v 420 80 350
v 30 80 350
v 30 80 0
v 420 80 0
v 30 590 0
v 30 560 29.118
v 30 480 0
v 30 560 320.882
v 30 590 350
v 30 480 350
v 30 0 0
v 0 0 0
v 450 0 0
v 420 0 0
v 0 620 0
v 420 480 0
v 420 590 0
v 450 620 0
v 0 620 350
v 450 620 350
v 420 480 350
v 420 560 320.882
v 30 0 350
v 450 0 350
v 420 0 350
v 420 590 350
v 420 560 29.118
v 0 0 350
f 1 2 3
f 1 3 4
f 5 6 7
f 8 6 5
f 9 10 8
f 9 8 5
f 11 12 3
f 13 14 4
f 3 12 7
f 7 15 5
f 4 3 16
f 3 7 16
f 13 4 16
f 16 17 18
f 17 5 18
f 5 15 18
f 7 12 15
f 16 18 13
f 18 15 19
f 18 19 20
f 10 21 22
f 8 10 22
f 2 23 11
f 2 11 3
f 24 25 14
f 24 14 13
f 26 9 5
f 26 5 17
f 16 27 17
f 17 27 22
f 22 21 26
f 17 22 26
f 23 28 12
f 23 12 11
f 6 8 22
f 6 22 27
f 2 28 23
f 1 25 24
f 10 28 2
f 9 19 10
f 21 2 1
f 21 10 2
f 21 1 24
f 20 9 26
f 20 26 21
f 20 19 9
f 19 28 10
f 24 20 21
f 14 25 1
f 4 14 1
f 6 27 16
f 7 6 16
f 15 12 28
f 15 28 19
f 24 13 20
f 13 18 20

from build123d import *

# Parameters (mm, degrees)
CROQUIS1_W              = 450
CROQUIS1_H              = 620
SALIENTE_EXTRUIR1_DEPTH = 350
CROQUIS2_W              = 390
CROQUIS2_H              = 80
CORTAR_EXTRUIR1_DEPTH   = 350
CROQUIS3_W              = 390
CROQUIS3_H              = 110
CORTAR_EXTRUIR2_DEPTH   = 350
SALIENTE_EXTRUIR2_DEPTH = 420


with BuildPart() as part:
    # Croquis1 → Saliente-Extruir1 (new body)
    with BuildSketch(Plane.XY):
        with Locations((225, 310)):
            Rectangle(CROQUIS1_W, CROQUIS1_H)
    extrude(amount=SALIENTE_EXTRUIR1_DEPTH)

    # Croquis2 → Cortar-Extruir1 (cut)
    with BuildSketch(Plane.XY.offset(350)):
        with Locations((225, 40)):
            Rectangle(CROQUIS2_W, CROQUIS2_H)
    extrude(amount=-CORTAR_EXTRUIR1_DEPTH, mode=Mode.SUBTRACT)

    # Croquis3 → Cortar-Extruir2 (cut)
    with BuildSketch(Plane.XY.offset(350)):
        with Locations((225, 535)):
            Rectangle(CROQUIS3_W, CROQUIS3_H)
    extrude(amount=-CORTAR_EXTRUIR2_DEPTH, mode=Mode.SUBTRACT)

    # Croquis4 → Saliente-Extruir2 (add)
    with BuildSketch(Plane(origin=(30, 0, 0), x_dir=(0, 0, -1), z_dir=(1, 0, 0))):
        Polygon((-350, 480), (-320.882381259, 560), (-29.117618741, 560), (0, 480), (0, 453.27353989), (-350, 453.27353989), align=None)
    extrude(amount=SALIENTE_EXTRUIR2_DEPTH)


solid = part.part
